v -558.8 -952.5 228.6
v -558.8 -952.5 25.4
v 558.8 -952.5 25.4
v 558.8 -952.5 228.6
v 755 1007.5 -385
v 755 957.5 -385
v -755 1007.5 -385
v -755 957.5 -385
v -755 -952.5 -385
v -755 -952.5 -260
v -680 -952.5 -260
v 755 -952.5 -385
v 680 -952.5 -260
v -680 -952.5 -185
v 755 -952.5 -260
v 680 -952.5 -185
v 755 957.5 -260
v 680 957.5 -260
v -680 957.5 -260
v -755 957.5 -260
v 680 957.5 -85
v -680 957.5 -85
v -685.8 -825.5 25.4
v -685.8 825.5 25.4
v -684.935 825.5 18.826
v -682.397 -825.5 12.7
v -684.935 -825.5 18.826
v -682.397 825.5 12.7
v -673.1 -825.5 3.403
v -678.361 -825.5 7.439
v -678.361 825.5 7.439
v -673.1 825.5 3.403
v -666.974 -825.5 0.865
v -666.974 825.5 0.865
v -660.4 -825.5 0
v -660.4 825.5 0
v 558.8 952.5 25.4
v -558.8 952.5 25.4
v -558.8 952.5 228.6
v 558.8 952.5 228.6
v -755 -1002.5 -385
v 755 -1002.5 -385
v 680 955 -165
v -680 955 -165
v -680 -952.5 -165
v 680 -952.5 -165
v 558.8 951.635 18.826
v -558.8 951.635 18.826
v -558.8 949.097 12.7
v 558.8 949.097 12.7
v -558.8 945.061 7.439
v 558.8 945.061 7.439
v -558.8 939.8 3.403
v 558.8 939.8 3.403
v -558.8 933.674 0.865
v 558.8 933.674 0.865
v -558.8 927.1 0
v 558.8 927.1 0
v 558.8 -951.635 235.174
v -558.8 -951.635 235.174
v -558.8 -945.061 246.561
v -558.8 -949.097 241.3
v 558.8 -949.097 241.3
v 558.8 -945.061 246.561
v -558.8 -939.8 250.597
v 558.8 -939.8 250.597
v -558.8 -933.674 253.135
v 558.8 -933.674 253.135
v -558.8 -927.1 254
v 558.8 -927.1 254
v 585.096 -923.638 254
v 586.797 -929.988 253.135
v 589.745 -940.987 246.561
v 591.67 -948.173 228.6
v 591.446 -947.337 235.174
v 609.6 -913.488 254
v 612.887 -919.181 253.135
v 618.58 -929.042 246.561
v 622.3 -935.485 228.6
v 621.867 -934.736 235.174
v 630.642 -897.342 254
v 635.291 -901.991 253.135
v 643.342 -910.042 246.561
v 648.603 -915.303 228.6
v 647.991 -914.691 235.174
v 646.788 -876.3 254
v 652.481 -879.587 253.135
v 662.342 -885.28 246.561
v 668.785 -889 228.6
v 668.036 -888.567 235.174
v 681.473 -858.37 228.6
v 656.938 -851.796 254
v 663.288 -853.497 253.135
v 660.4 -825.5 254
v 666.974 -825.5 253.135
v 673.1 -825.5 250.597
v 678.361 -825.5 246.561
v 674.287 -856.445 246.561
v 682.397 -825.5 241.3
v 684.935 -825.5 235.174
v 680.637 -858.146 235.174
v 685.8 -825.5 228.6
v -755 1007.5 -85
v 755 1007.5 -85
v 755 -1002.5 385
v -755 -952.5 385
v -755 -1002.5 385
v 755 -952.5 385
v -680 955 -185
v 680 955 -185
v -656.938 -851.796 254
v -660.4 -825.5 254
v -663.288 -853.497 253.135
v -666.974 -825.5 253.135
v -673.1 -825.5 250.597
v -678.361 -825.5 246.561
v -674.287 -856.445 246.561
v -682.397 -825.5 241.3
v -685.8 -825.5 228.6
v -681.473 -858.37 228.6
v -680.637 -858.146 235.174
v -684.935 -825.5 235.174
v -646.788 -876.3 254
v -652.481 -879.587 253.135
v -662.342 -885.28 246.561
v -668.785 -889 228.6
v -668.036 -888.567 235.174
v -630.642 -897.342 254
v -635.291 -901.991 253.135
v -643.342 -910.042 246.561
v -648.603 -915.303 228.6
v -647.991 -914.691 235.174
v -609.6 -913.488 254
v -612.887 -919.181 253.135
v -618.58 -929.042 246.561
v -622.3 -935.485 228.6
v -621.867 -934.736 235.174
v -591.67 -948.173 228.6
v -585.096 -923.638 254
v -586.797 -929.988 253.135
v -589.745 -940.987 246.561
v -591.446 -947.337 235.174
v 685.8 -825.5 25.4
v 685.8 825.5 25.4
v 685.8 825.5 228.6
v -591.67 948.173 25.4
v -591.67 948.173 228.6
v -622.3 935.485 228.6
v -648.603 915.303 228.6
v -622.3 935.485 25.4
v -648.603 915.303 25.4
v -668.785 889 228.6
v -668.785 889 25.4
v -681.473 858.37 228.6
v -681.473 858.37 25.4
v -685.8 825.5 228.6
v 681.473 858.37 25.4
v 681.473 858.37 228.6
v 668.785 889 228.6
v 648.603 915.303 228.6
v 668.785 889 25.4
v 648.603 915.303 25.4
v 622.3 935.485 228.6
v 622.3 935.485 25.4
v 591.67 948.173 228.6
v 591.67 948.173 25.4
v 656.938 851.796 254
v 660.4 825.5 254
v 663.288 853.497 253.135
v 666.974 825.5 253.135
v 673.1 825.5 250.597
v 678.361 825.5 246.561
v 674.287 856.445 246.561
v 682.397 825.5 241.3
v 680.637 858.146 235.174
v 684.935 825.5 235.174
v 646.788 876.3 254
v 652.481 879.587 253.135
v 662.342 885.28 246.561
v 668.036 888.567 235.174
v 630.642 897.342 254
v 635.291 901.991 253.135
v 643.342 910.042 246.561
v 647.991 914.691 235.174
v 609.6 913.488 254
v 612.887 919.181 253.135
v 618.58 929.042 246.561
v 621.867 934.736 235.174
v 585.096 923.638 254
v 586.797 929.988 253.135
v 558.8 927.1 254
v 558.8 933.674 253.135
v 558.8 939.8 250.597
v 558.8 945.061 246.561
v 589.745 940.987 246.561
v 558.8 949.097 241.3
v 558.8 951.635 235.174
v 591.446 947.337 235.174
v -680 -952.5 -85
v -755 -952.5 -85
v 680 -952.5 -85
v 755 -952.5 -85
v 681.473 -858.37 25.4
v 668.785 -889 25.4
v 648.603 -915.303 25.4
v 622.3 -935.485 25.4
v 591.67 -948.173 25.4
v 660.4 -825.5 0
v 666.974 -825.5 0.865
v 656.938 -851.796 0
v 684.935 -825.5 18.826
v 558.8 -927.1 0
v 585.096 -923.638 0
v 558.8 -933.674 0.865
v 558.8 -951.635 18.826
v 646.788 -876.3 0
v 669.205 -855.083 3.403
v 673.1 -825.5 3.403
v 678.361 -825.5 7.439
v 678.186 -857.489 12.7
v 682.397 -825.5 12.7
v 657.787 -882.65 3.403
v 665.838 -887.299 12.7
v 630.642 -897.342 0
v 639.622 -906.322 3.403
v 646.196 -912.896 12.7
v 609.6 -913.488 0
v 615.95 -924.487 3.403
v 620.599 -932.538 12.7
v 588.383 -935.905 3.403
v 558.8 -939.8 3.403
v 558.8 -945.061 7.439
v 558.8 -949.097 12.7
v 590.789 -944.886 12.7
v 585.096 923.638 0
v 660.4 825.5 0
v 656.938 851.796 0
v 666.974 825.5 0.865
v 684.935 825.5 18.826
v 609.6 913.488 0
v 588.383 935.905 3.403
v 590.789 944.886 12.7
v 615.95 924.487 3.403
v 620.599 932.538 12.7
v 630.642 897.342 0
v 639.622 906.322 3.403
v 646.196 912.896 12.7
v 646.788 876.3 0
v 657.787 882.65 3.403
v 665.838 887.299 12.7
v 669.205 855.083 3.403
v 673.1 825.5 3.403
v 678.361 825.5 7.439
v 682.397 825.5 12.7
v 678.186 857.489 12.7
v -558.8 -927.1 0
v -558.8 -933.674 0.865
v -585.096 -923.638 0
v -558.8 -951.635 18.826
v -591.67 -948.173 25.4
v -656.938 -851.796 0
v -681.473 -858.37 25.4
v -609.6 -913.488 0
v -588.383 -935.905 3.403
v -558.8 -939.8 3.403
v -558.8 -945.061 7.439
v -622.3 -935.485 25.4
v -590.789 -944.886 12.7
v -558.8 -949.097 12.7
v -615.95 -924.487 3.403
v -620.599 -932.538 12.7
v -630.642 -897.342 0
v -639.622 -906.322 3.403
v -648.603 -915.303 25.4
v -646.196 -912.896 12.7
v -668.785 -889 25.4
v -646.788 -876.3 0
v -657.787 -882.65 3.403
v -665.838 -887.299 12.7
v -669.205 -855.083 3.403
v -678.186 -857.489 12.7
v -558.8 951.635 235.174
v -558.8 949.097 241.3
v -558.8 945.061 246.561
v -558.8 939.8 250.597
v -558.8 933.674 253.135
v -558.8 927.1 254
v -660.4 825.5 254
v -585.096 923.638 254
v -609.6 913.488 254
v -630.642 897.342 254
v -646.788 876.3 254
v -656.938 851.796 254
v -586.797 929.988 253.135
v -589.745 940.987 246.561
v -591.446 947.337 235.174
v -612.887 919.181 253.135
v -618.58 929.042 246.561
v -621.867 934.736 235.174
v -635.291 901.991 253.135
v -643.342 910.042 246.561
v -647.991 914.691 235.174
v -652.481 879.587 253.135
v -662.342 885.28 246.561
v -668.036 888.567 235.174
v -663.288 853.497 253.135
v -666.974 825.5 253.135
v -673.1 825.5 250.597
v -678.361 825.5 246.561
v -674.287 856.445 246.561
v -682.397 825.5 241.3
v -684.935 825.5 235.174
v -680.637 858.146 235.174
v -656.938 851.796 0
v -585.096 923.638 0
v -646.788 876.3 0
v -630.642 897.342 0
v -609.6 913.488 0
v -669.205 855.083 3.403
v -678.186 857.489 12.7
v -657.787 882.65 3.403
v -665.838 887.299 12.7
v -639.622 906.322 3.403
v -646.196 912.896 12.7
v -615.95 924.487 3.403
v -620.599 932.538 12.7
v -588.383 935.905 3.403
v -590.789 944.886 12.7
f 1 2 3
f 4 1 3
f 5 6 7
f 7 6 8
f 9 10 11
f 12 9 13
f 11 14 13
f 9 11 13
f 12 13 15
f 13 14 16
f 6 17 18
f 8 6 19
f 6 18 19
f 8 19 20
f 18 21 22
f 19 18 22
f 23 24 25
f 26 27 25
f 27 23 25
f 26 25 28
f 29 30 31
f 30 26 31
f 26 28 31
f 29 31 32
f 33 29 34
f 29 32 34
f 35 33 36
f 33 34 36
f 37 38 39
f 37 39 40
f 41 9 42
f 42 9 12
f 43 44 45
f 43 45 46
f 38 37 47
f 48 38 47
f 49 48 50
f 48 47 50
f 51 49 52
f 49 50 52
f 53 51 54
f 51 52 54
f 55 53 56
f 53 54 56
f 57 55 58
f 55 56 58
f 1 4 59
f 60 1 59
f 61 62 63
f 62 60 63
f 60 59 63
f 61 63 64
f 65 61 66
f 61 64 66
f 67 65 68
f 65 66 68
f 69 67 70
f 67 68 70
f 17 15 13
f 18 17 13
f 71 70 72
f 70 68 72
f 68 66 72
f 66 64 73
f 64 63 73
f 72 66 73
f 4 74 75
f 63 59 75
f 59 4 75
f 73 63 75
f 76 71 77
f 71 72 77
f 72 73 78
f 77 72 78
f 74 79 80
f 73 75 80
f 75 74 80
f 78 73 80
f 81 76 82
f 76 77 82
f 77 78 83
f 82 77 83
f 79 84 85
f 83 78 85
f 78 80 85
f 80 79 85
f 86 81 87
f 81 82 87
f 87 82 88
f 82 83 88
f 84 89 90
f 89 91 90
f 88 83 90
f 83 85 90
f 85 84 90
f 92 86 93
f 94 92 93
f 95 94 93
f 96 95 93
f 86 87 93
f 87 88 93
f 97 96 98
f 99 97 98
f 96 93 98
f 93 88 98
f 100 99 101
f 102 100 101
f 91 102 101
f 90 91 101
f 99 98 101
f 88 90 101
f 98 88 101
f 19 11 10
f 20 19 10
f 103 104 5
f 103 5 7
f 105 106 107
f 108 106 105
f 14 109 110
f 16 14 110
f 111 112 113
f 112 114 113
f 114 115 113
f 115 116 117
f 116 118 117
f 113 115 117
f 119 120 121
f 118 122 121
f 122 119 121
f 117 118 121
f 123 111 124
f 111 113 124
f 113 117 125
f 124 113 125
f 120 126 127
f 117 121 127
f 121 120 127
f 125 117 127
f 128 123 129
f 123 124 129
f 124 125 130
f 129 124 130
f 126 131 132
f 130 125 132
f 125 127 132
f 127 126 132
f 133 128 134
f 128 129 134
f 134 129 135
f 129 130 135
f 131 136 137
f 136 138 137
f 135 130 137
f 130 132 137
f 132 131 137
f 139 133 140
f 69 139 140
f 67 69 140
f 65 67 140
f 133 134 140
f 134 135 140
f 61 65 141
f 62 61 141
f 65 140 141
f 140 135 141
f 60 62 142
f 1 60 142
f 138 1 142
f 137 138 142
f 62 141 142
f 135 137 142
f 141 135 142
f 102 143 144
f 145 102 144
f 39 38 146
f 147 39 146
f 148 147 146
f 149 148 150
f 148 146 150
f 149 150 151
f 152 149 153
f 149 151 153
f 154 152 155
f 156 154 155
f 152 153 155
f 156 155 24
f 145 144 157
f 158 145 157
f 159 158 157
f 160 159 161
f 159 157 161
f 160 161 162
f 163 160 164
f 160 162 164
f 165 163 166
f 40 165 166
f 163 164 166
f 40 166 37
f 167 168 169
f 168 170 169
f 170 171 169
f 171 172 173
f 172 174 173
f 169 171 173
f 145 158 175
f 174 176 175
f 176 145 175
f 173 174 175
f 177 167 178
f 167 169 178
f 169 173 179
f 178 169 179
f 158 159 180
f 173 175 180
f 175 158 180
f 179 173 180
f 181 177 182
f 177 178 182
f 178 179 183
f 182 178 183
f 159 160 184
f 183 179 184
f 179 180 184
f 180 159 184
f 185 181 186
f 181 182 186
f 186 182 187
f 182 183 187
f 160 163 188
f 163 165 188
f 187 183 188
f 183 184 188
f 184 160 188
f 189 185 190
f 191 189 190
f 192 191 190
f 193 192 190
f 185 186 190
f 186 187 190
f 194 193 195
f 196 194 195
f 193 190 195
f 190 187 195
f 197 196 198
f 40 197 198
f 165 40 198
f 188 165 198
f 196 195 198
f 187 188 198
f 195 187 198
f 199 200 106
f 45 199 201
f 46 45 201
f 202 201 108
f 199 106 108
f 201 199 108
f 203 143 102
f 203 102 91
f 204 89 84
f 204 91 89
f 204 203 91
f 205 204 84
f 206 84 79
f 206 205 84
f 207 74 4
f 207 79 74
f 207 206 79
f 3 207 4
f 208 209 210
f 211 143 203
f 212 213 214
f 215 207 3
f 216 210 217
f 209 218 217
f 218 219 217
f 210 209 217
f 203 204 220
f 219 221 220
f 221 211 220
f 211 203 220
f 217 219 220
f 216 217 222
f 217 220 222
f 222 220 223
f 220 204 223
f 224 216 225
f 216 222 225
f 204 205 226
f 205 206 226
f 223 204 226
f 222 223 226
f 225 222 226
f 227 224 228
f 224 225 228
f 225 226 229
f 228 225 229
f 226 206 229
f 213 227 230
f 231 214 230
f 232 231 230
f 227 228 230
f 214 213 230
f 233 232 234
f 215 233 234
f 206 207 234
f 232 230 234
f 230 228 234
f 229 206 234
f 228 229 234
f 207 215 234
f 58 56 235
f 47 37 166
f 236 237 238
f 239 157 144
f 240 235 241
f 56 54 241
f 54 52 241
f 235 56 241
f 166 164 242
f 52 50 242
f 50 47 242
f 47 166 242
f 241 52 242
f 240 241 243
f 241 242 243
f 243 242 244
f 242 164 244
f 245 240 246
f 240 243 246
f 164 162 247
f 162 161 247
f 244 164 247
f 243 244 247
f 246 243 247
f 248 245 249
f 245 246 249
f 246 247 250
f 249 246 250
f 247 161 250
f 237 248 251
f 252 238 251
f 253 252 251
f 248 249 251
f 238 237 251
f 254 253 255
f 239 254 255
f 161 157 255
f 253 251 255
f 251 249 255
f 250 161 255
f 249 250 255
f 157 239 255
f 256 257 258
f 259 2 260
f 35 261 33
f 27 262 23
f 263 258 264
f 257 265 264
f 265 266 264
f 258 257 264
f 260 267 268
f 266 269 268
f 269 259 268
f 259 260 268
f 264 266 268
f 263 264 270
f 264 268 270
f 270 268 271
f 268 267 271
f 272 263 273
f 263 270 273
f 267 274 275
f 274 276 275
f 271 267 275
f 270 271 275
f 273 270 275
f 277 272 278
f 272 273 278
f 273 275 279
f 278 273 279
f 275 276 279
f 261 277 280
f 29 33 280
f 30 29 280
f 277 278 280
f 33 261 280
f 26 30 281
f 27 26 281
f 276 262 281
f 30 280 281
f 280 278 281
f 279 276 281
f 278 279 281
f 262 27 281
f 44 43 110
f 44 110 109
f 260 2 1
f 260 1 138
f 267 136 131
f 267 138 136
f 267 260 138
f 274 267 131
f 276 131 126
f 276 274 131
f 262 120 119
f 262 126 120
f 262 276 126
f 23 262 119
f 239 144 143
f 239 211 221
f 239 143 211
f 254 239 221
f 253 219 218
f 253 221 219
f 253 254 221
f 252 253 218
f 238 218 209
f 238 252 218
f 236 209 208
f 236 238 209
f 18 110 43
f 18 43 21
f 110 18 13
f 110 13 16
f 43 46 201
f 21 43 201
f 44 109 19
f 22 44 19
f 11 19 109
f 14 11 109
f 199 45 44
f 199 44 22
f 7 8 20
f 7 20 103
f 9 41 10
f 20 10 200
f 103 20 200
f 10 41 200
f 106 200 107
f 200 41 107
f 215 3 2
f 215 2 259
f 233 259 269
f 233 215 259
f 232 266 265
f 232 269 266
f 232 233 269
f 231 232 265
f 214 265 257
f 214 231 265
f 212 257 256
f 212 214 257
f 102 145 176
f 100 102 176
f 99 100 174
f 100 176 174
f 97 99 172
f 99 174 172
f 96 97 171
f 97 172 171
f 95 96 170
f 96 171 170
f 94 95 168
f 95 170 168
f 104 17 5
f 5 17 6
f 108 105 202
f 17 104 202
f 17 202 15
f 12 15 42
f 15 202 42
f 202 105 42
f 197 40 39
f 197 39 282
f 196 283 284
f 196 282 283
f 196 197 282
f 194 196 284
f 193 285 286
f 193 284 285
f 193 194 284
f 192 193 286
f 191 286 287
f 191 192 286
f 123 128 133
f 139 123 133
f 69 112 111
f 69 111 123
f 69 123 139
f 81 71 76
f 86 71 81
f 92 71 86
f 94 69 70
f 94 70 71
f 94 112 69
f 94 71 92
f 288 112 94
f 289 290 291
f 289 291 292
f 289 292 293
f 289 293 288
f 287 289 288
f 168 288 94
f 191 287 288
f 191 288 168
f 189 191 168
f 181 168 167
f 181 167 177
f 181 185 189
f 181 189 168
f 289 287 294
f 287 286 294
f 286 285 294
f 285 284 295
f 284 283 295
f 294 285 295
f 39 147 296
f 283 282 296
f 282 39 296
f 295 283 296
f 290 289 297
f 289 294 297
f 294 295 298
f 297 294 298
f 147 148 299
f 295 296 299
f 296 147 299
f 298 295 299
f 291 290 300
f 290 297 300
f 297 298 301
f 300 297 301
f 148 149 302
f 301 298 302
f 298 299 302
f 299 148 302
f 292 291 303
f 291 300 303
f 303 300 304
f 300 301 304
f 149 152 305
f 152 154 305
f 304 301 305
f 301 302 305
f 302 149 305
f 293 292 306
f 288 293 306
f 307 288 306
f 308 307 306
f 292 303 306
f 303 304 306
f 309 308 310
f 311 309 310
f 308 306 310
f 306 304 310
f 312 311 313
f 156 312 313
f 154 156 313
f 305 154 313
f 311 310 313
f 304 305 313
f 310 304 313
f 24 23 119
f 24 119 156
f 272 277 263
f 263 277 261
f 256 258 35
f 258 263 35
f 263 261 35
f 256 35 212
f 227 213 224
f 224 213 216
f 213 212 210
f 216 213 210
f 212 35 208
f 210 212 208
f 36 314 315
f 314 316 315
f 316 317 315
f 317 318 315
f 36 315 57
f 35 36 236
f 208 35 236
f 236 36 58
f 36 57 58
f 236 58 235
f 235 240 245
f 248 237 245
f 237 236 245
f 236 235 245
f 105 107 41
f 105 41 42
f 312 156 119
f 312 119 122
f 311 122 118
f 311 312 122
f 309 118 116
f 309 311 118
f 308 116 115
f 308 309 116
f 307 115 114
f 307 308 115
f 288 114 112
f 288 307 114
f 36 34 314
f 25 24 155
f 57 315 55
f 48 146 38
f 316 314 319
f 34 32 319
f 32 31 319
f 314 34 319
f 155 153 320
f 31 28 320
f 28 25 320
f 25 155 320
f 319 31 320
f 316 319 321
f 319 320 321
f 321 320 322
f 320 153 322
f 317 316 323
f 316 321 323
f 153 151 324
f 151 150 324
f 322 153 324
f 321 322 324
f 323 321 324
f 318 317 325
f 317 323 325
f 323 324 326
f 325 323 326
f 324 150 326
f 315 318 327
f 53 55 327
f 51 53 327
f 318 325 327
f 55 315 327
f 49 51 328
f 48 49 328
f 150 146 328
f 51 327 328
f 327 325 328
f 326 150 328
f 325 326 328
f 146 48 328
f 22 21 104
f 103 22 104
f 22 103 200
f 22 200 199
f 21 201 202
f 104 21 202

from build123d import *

# Parameters (mm, degrees)
F0_W         = 1371.6
F0_H         = 1905
F1_DEPTH     = 254
F2_R         = 25.4
F3_T1_DEPTH  = 254
F3_T4_ANGLE  = 90
F3_T6_ANGLE  = 90
F3_T8_ANGLE  = 90
F3_T10_ANGLE = 90
F3_T12_ANGLE = 90
F3_T14_ANGLE = 90
F3_T16_ANGLE = 90
F3_T18_ANGLE = 90
F4_W         = 1510
F4_H         = 770
F4_W_2       = 1117.6
F4_H_2       = 203.2
F5_DEPTH     = 50
F6_W         = 75
F6_H         = 175
F7_DEPTH     = 1910
F8_W         = 75
F8_H         = 175
F9_DEPTH     = 50
F11_START    = -80
F11_DEPTH    = 20


# Not quite as in the source:
# - a fillet or chamfer that OpenCascade refuses, or shapes differently, is made with other operations: its cross-section is extruded or revolved along the edge and cut away or added


with BuildPart() as f1:
    # F0 (on Top) → F1 (new body)
    with BuildSketch(Plane.XY):
        Rectangle(F0_W, F0_H)
    extrude(amount=F1_DEPTH)

    # F2
    f2_edges = [f1.edges().sort_by_distance(p)[0] for p in [
        (-685.8, 0, 254),
        (0, 952.5, 254),
        (685.8, 0, 254),
        (0, -952.5, 254),
        (685.8, 0, 0),
        (0, 952.5, 0),
        (-685.8, 0, 0),
        (0, -952.5, 0),
    ]]
    fillet(f2_edges, radius=F2_R)

    # F3: fillet of radius 127 on 4 edges, made by hand

    # F3_s2 → F3_t1 (cut)
    with BuildSketch(Plane.XY):
        with BuildLine():
            ThreePointArc((685.8, -825.5), (648.6025612107, -915.3025612107), (558.8, -952.5))
            Line((558.8, -952.5), (685.8, -952.5))
            Line((685.8, -952.5), (685.8, -825.5))
        make_face()
        with BuildLine():
            ThreePointArc((685.8, 825.5), (648.6025612107, 915.3025612107), (558.8, 952.5))
            Line((558.8, 952.5), (685.8, 952.5))
            Line((685.8, 952.5), (685.8, 825.5))
        make_face()
        with BuildLine():
            ThreePointArc((-558.8, 952.5), (-648.6025612107, 915.3025612107), (-685.8, 825.5))
            Line((-685.8, 825.5), (-685.8, 952.5))
            Line((-685.8, 952.5), (-558.8, 952.5))
        make_face()
        with BuildLine():
            ThreePointArc((-558.8, -952.5), (-648.6025612107, -915.3025612107), (-685.8, -825.5))
            Line((-685.8, -825.5), (-685.8, -952.5))
            Line((-685.8, -952.5), (-558.8, -952.5))
        make_face()
    extrude(amount=F3_T1_DEPTH, mode=Mode.SUBTRACT)

    # F3_s3 → F3_t4 (revolve, cut)
    with BuildSketch(Plane.YZ.offset(-558.8)):
        with BuildLine():
            ThreePointArc((-927.1, 0), (-945.0605122421, 7.4394877579), (-952.5, 25.4))
            Line((-952.5, 25.4), (-952.5, 0))
            Line((-952.5, 0), (-927.1, 0))
        make_face()
    revolve(axis=Axis((-558.8, -825.5, 0), (0, 0, -1)), revolution_arc=F3_T4_ANGLE, mode=Mode.SUBTRACT)

    # F3_s5 → F3_t6 (revolve, cut)
    with BuildSketch(Plane.XZ.offset(825.5)):
        with BuildLine():
            ThreePointArc((-660.4, 254), (-678.3605122421, 246.5605122421), (-685.8, 228.6))
            Line((-685.8, 228.6), (-685.8, 254))
            Line((-685.8, 254), (-660.4, 254))
        make_face()
    revolve(axis=Axis((-558.8, -825.5, 254), (0, 0, 1)), revolution_arc=F3_T6_ANGLE, mode=Mode.SUBTRACT)

    # F3_s7 → F3_t8 (revolve, cut)
    with BuildSketch(Plane.XZ.offset(-825.5)):
        with BuildLine():
            ThreePointArc((-660.4, 0), (-678.3605122421, 7.4394877579), (-685.8, 25.4))
            Line((-685.8, 25.4), (-685.8, 0))
            Line((-685.8, 0), (-660.4, 0))
        make_face()
    revolve(axis=Axis((-558.8, 825.5, 0), (0, 0, -1)), revolution_arc=F3_T8_ANGLE, mode=Mode.SUBTRACT)

    # F3_s9 → F3_t10 (revolve, cut)
    with BuildSketch(Plane.YZ.offset(-558.8)):
        with BuildLine():
            ThreePointArc((927.1, 254), (945.0605122421, 246.5605122421), (952.5, 228.6))
            Line((952.5, 228.6), (952.5, 254))
            Line((952.5, 254), (927.1, 254))
        make_face()
    revolve(axis=Axis((-558.8, 825.5, 254), (0, 0, 1)), revolution_arc=F3_T10_ANGLE, mode=Mode.SUBTRACT)

    # F3_s11 → F3_t12 (revolve, cut)
    with BuildSketch(Plane.YZ.offset(558.8)):
        with BuildLine():
            ThreePointArc((927.1, 0), (945.0605122421, 7.4394877579), (952.5, 25.4))
            Line((952.5, 25.4), (952.5, 0))
            Line((952.5, 0), (927.1, 0))
        make_face()
    revolve(axis=Axis((558.8, 825.5, 0), (0, 0, -1)), revolution_arc=F3_T12_ANGLE, mode=Mode.SUBTRACT)

    # F3_s13 → F3_t14 (revolve, cut)
    with BuildSketch(Plane.XZ.offset(-825.5)):
        with BuildLine():
            ThreePointArc((660.4, 254), (678.3605122421, 246.5605122421), (685.8, 228.6))
            Line((685.8, 228.6), (685.8, 254))
            Line((685.8, 254), (660.4, 254))
        make_face()
    revolve(axis=Axis((558.8, 825.5, 254), (0, 0, 1)), revolution_arc=F3_T14_ANGLE, mode=Mode.SUBTRACT)

    # F3_s15 → F3_t16 (revolve, cut)
    with BuildSketch(Plane.XZ.offset(825.5)):
        with BuildLine():
            ThreePointArc((660.4, 0), (678.3605122421, 7.4394877579), (685.8, 25.4))
            Line((685.8, 25.4), (685.8, 0))
            Line((685.8, 0), (660.4, 0))
        make_face()
    revolve(axis=Axis((558.8, -825.5, 0), (0, 0, -1)), revolution_arc=F3_T16_ANGLE, mode=Mode.SUBTRACT)

    # F3_s17 → F3_t18 (revolve, cut)
    with BuildSketch(Plane.YZ.offset(558.8)):
        with BuildLine():
            ThreePointArc((-927.1, 254), (-945.0605122421, 246.5605122421), (-952.5, 228.6))
            Line((-952.5, 228.6), (-952.5, 254))
            Line((-952.5, 254), (-927.1, 254))
        make_face()
    revolve(axis=Axis((558.8, -825.5, 254), (0, 0, 1)), revolution_arc=F3_T18_ANGLE, mode=Mode.SUBTRACT)


with BuildPart() as f5:
    # F4 (on face) → F5 (new body)
    with BuildSketch(Plane.XZ.offset(952.5)):
        Rectangle(F4_W, F4_H)
        with Locations((0, 127)):
            Rectangle(F4_W_2, F4_H_2, mode=Mode.SUBTRACT)
        with Locations((0, 127)):
            Rectangle(F4_W_2, F4_H_2)
    extrude(amount=F5_DEPTH)

    # F6 (on face) → F7 (join)
    with BuildSketch(Plane(origin=(0, -952.5, 0), x_dir=(-1, 0, 0), z_dir=(0, 1, 0))):
        with Locations((-717.5, -172.5)):
            Rectangle(F6_W, F6_H)
        with Locations((717.5, -172.5)):
            Rectangle(F6_W, F6_H)
    extrude(amount=F7_DEPTH)

    # F8 (on face) → F9 (join)
    with BuildSketch(Plane(origin=(0, 957.5, 0), x_dir=(-1, 0, 0), z_dir=(0, 1, 0))):
        with Locations((-717.5, -172.5)):
            Rectangle(F8_W, F8_H)
        Polygon((755, -85), (-680, -85), (-680, -260), (-755, -260), (-755, -385), (755, -385), align=None)
    extrude(amount=F9_DEPTH)

    # F10 (on face) → F11 (join)
    with BuildSketch(Plane.XY.offset(-85).offset(F11_START)):
        Polygon((680, 955), (-680, 955), (-680, -952.5), (-680, -955), (680, -955), (680, -952.5), align=None)
    extrude(amount=-F11_DEPTH)


solid = Compound([f1.part, f5.part])
